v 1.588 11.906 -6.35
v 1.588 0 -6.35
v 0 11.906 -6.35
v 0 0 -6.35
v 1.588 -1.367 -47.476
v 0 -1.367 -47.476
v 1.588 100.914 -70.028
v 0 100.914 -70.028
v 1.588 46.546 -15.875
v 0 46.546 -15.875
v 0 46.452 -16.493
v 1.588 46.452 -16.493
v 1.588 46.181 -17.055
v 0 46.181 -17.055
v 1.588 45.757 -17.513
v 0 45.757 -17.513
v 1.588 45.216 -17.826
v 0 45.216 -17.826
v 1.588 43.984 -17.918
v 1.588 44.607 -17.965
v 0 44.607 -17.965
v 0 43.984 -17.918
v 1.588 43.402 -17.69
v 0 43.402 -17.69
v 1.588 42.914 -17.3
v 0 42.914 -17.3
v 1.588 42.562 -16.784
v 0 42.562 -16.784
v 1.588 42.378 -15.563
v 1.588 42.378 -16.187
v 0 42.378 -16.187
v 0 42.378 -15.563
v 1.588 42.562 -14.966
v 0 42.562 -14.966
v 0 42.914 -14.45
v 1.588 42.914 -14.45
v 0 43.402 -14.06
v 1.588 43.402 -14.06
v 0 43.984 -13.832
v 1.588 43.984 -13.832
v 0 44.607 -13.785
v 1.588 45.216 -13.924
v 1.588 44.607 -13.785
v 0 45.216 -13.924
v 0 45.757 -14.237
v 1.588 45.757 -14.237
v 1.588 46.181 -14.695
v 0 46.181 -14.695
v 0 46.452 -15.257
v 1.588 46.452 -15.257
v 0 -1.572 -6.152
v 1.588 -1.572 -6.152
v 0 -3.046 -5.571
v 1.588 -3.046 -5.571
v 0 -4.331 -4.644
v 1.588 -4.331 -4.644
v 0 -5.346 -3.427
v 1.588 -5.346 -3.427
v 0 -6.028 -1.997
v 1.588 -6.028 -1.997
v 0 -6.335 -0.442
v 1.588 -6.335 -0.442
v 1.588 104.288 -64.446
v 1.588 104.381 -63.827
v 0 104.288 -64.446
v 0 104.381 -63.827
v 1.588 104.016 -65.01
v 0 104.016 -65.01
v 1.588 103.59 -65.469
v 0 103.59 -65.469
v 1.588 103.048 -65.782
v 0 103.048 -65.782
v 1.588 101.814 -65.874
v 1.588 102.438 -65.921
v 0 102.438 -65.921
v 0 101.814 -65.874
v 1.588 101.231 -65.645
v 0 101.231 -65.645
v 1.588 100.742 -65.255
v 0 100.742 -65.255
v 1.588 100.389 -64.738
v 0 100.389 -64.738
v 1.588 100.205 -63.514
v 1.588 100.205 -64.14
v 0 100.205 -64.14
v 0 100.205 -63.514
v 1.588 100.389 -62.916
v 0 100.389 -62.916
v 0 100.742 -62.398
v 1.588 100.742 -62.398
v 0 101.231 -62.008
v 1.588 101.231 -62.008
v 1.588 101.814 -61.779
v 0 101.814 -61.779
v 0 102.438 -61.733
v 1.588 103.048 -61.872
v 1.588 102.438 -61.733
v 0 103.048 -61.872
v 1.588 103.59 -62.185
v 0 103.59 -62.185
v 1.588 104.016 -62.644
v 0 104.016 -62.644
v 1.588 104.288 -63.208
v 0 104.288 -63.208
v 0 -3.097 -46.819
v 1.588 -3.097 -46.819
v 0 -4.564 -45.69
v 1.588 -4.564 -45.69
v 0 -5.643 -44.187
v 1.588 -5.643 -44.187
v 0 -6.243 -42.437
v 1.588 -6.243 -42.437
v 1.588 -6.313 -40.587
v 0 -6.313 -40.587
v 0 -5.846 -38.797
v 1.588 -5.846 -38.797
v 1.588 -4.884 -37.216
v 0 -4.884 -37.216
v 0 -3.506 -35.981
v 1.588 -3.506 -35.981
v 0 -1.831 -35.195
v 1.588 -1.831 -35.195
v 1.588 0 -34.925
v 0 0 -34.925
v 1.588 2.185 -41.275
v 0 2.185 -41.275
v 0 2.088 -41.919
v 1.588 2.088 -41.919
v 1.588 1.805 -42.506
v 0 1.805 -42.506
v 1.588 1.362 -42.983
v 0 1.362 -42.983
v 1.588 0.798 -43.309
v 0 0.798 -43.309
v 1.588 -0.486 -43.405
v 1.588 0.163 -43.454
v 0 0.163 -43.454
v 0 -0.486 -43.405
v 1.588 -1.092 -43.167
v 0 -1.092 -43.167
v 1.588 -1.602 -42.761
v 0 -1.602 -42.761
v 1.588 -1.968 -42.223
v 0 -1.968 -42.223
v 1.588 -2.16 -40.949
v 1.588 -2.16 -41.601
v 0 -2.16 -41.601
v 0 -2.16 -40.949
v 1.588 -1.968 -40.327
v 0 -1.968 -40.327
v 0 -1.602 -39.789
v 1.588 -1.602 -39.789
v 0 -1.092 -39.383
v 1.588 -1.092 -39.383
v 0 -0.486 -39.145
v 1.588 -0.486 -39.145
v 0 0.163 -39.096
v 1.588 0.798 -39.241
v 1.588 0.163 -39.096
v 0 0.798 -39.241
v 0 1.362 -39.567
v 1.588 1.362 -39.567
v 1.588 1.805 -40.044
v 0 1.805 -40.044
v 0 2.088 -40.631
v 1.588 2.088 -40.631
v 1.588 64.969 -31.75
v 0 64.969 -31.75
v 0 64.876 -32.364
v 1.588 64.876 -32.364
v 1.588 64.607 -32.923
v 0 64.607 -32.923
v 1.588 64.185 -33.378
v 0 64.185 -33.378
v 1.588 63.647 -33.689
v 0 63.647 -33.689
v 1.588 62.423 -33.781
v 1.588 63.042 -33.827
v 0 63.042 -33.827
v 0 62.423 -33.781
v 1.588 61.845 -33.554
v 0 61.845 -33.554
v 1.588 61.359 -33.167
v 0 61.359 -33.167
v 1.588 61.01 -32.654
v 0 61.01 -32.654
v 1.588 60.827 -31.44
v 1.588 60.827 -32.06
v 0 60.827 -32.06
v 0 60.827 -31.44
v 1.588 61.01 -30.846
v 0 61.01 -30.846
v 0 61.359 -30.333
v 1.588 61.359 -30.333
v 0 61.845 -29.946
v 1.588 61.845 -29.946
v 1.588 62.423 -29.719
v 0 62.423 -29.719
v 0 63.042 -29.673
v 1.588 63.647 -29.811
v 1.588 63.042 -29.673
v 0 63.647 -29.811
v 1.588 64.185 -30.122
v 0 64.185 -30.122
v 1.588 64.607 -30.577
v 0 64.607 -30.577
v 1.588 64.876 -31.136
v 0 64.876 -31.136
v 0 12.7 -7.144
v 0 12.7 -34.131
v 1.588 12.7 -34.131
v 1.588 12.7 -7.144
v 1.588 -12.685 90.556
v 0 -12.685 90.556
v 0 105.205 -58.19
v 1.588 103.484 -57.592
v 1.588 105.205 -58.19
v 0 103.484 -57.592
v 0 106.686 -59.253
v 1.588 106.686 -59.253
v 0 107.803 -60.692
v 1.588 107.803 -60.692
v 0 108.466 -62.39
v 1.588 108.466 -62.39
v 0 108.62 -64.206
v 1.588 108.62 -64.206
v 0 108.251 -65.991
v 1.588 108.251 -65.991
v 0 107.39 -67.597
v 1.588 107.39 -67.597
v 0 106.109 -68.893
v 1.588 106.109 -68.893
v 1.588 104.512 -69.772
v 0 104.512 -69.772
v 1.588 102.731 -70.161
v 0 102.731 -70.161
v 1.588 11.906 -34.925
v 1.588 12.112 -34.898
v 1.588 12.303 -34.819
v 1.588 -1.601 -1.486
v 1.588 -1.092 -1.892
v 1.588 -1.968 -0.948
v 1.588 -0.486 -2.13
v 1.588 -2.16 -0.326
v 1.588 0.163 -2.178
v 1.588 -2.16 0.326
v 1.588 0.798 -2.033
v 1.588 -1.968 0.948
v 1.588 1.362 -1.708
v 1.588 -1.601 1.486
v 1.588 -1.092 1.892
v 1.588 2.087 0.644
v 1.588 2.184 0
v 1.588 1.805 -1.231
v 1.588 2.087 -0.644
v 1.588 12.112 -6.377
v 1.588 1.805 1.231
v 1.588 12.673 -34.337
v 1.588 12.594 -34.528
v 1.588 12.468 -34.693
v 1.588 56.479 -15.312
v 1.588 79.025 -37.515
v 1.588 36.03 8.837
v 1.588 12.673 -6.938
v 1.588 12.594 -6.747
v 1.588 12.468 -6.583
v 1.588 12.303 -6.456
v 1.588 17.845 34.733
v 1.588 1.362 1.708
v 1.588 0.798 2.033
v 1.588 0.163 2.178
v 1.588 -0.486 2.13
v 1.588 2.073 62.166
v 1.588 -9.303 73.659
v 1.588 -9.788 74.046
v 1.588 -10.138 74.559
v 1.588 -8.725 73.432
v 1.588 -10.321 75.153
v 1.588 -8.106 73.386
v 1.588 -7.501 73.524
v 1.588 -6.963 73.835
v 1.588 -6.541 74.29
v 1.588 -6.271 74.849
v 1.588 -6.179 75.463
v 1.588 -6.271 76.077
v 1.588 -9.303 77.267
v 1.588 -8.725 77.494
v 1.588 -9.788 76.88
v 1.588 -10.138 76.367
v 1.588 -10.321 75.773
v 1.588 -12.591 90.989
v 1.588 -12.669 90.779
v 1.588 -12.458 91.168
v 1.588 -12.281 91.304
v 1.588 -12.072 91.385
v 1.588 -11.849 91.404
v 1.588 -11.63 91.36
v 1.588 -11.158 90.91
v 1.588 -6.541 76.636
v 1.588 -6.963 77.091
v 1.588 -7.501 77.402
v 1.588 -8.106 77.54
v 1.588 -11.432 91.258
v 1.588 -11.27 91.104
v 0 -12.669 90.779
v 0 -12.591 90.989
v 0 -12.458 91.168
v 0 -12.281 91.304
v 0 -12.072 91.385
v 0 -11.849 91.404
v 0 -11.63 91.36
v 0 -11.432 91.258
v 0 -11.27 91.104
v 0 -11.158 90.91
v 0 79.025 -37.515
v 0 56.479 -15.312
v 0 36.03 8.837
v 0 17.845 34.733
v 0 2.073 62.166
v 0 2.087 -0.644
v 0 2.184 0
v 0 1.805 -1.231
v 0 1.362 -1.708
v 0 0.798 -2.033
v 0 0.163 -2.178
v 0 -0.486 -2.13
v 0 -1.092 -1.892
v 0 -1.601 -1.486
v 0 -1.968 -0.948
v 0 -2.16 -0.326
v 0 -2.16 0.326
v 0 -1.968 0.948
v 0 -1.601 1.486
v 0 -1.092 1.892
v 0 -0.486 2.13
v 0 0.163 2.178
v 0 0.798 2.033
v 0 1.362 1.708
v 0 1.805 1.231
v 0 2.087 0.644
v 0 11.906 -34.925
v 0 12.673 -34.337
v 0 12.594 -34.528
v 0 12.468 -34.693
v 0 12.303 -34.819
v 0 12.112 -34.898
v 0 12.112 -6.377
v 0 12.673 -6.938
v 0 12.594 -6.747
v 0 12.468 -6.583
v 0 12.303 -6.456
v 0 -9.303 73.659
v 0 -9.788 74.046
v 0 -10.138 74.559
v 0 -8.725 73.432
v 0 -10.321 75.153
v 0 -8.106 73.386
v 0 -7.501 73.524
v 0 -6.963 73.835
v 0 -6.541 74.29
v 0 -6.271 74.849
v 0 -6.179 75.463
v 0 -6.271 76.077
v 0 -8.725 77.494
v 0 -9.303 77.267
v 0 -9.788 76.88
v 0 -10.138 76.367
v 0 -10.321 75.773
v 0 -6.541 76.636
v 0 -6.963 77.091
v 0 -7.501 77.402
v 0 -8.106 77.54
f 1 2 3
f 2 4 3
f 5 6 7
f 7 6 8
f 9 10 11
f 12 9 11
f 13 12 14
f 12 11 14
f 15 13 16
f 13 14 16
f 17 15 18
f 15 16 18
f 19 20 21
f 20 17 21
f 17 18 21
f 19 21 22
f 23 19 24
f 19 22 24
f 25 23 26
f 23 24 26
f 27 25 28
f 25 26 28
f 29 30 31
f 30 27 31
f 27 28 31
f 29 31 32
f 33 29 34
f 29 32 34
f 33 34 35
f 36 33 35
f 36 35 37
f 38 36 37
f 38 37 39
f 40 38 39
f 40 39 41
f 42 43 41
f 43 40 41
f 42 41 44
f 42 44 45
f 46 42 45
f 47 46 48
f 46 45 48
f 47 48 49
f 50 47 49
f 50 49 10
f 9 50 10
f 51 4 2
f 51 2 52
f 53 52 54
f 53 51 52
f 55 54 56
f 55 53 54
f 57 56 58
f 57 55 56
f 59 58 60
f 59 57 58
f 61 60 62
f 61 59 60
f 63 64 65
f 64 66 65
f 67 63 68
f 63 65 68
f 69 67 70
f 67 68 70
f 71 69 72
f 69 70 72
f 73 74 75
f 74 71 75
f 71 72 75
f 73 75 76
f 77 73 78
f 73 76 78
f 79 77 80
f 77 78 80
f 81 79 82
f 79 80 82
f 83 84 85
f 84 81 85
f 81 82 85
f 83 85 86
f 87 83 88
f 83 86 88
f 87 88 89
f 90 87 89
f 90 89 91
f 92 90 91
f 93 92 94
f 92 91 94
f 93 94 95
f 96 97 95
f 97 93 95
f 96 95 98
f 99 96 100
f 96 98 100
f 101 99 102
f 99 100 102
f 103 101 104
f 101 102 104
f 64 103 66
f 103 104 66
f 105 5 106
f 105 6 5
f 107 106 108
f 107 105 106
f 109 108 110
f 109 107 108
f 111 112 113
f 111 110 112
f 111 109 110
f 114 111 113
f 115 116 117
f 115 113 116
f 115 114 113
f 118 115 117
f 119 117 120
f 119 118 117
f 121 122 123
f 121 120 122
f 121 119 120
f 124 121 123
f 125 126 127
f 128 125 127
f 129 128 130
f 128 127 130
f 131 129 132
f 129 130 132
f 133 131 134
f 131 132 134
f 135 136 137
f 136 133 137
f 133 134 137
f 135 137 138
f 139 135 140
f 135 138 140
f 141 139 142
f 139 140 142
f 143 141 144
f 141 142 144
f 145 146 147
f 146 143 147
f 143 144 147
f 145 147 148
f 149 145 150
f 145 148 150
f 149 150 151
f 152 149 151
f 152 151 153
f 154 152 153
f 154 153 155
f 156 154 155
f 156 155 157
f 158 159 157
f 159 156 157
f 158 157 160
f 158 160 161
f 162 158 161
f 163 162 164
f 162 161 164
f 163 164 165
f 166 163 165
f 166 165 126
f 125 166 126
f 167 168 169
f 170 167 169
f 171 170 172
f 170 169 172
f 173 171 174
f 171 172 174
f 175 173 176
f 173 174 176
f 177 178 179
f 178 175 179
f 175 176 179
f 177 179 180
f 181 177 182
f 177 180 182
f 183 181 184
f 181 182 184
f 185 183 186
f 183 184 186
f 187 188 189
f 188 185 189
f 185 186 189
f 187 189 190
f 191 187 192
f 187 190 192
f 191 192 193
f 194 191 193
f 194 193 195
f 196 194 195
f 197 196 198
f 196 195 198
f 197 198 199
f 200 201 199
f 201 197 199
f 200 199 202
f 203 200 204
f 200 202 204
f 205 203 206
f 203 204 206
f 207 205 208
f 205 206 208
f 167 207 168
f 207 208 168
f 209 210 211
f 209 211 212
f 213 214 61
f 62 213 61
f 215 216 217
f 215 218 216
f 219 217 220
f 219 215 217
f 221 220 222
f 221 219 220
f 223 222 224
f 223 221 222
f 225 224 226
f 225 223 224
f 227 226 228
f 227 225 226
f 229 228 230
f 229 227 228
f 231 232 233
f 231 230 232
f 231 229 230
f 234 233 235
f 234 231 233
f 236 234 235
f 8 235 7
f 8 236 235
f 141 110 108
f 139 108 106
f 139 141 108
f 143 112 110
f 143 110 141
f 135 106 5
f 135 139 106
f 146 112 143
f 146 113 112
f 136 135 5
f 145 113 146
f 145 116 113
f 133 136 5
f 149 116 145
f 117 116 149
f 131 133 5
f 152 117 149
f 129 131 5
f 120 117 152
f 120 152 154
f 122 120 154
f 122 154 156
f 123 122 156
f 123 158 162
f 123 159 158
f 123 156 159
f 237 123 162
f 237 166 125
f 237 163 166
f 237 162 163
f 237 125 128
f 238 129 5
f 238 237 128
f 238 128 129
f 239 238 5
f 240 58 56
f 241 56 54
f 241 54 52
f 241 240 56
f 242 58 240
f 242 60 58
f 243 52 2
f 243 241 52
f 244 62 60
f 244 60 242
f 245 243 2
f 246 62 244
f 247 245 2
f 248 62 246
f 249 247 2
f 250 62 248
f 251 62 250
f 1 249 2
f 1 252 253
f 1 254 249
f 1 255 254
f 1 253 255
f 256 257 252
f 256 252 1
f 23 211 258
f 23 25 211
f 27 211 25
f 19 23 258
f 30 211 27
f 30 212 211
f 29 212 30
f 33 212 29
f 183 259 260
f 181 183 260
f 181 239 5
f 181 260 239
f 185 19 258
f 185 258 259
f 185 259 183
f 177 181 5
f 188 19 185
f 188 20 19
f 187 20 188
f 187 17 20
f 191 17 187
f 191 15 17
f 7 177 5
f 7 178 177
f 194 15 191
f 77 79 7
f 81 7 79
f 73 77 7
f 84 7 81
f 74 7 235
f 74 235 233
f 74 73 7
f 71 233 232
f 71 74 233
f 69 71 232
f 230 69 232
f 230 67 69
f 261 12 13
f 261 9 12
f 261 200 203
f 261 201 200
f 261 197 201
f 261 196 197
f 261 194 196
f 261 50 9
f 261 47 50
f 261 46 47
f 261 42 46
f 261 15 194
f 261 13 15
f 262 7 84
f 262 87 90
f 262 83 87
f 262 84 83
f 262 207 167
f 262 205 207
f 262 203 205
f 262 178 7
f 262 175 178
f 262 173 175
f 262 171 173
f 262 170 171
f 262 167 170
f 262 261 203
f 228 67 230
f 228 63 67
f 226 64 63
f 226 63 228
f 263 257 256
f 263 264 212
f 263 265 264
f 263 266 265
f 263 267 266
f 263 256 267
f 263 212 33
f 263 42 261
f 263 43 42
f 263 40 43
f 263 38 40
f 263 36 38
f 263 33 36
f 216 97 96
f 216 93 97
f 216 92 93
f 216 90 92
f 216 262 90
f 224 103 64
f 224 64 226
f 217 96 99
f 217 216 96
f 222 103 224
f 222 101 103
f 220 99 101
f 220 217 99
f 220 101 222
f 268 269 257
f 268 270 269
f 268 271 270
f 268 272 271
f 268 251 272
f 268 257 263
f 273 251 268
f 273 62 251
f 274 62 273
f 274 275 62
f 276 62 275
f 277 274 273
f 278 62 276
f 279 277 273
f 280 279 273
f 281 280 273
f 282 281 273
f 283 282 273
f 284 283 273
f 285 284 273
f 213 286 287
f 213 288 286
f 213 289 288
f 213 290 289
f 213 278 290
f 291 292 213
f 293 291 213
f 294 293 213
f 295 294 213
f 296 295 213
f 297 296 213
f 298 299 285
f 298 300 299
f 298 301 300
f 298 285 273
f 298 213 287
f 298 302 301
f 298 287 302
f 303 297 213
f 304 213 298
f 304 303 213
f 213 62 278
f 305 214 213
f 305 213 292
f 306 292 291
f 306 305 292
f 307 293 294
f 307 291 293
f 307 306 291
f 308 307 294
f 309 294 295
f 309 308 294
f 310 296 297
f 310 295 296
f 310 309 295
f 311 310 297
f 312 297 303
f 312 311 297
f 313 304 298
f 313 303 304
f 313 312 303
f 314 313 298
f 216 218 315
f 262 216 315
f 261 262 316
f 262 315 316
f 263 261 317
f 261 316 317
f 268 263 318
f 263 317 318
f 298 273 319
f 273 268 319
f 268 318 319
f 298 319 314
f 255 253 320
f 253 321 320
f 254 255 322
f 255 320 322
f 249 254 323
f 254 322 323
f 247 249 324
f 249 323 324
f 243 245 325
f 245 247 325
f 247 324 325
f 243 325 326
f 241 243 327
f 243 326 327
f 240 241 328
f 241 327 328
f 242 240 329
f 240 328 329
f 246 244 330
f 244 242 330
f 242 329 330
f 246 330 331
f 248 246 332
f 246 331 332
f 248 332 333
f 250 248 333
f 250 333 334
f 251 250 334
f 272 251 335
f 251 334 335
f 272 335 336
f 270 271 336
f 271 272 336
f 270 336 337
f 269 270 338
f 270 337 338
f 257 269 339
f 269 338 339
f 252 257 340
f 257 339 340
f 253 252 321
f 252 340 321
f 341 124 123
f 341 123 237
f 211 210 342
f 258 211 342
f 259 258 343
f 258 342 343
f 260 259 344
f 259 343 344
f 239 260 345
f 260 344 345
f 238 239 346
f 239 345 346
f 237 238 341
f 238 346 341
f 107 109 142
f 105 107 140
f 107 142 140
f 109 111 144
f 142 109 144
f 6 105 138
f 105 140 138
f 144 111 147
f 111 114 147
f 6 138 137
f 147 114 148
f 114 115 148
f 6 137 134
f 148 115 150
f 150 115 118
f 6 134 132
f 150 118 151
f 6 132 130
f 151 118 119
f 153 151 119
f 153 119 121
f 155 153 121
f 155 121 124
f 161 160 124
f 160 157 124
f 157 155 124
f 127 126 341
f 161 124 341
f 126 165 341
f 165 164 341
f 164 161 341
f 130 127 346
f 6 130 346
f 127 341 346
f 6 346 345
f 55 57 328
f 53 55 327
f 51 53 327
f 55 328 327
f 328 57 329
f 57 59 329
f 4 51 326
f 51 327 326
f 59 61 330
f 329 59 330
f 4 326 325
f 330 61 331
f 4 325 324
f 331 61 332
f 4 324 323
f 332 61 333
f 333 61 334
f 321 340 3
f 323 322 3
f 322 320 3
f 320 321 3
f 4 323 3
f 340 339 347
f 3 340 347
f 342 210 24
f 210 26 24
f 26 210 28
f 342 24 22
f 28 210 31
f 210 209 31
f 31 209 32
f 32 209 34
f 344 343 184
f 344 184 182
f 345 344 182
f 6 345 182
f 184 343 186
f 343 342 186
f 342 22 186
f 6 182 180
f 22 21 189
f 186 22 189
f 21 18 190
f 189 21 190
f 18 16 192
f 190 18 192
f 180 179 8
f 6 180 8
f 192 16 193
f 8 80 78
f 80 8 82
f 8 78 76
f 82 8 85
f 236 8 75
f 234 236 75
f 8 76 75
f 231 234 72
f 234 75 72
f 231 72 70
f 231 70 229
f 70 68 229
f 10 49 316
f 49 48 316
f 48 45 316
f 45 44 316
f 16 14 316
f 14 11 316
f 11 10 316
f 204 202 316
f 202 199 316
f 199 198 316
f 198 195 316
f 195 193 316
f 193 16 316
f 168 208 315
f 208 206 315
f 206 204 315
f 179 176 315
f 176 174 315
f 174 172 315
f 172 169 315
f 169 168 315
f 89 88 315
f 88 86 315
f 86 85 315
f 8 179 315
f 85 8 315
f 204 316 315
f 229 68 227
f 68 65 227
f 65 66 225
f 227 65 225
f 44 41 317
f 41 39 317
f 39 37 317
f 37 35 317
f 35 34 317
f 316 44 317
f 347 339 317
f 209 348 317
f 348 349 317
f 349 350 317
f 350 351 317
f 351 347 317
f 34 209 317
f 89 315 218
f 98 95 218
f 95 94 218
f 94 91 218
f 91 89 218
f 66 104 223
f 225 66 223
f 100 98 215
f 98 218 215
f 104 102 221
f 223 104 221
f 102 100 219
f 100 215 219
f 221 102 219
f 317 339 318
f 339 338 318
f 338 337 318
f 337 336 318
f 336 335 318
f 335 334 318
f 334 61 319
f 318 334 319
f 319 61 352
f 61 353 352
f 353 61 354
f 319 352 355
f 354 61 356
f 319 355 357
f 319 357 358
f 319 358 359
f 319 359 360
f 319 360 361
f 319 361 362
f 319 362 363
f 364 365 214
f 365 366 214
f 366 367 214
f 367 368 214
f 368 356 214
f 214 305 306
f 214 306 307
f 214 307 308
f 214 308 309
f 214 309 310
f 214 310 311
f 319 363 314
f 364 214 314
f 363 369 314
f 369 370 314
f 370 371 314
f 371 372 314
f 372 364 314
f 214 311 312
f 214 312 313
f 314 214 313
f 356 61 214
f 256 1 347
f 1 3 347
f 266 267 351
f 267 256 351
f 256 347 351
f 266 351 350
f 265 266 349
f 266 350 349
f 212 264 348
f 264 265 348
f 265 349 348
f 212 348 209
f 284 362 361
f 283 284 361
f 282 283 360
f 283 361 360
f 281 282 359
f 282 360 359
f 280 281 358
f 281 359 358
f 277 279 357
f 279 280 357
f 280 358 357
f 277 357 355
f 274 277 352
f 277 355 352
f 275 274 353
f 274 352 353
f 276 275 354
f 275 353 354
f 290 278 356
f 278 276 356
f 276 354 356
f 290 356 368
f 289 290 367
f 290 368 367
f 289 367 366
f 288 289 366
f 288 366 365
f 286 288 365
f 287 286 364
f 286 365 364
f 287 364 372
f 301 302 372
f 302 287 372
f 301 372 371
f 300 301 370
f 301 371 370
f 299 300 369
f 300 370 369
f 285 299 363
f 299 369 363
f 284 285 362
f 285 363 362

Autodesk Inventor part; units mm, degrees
ref_plane "YZ Plane" through (0, 0, 0) normal (1, 0, 0) x (0, 1, 0)
ref_plane "XZ Plane" through (0, 0, 0) normal (0, 1, 0) x (-1, 0, 0)
ref_plane "XY Plane" through (0, 0, 0) normal (0, 0, 1) x (1, 0, 0)
sketch "main" plane through (0, 0, 0) normal (0, 0, 1) x (1, 0, 0)
  circle A0 centre (-198.1135, 49.9495) radius 2.1844
  circle A1 centre (-95.8324, -13.8772) radius 2.1
  arc A2 (-99.5351, -19.036) -> (-94.63, -7.6421) centre (-95.8324, -13.8772) ccw
  arc A3 (-204.4481, 49.5075) -> (-198.1135, 43.5995) centre (-198.1135, 49.9495) ccw
  line L0 (-210.7981, 140.5057) -> (-204.4481, 49.5075)
  arc A4 (-209.271, 140.8599) -> (-94.63, -7.6421) centre (115.0165, 272.7027) ccw
  circle A5 centre (-206.375, 125.4125) radius 2.0828
  line L1 (-198.1135, 43.5995) -> (-186.2072, 43.5995)
  arc A6 (-209.271, 140.8599) -> (-210.7981, 140.5057) centre (-210.0063, 140.561) ccw
  circle A7 centre (-135.2274, 18.1995) radius 2.0828
  line L2 (-185.4135, 15.8183) -> (-185.4135, 42.8058)
  line L3 (-198.1135, 15.0245) -> (-186.2072, 15.0245)
  arc A8 (-185.4135, 42.8058) -> (-186.2072, 43.5995) centre (-186.2072, 42.8058) ccw
  arc A9 (-186.2072, 15.0245) -> (-185.4135, 15.8183) centre (-186.2072, 15.8183) ccw
  line L4 (-199.4808, 2.4735) -> (-97.1997, -20.0783)
  circle A10 centre (-198.1135, 8.6745) radius 2.1848
  arc A11 (-198.1135, 15.0245) -> (-199.4808, 2.4735) centre (-198.1135, 8.6745) ccw
  point P0 (1.1251, 9.7944)
  point P1 (-211.1526, 145.5863)
  point P2 (-191.7635, 49.9495)
  dimension "d7" = 12.7
  dimension "d8" = 4.1656
  dimension "d9" = 6.35
  dimension "d11" = 0.7937
  dimension "d13" = 4.1656
  dimension "d16" = 0.7937
  dimension "d19" = 26.9875
  dimension "d20" = 0
  dimension "d21" = 6.35
  dimension "d24" = 6.35
sketch "Sketch1" plane through (0, 0, 0) normal (1, 0, 0) x (0, 1, 0)
  circle A0 centre (44.45, -15.875) radius 2.0955
  circle A1 centre (0, 0) radius 2.1844
  circle A2 centre (102.2811, -63.8268) radius 2.1
  arc A3 (98.5784, -68.9855) -> (103.4835, -57.5917) centre (102.2811, -63.8268) ccw
  arc A4 (-6.3346, -0.442) -> (0, -6.35) centre (0, 0) ccw
  line L0 (-12.6846, 90.5562) -> (-6.3346, -0.442)
  arc A5 (-11.1575, 90.9104) -> (103.4835, -57.5917) centre (313.1299, 222.7532) ccw
  circle A6 centre (-8.2615, 75.463) radius 2.0828
  line L1 (0, -6.35) -> (11.9063, -6.35)
  arc A7 (-11.1575, 90.9104) -> (-12.6846, 90.5562) centre (-11.8928, 90.6114) ccw
  circle A8 centre (62.8861, -31.75) radius 2.0828
  line L2 (12.7, -34.1313) -> (12.7, -7.1438)
  line L3 (0, -34.925) -> (11.9063, -34.925)
  arc A9 (12.7, -7.1438) -> (11.9063, -6.35) centre (11.9063, -7.1437) ccw
  arc A10 (11.9063, -34.925) -> (12.7, -34.1313) centre (11.9063, -34.1313) ccw
  line L4 (-1.3673, -47.4761) -> (100.9138, -70.0278)
  circle A11 centre (0, -41.275) radius 2.1848
  arc A12 (0, -34.925) -> (-1.3673, -47.4761) centre (0, -41.275) ccw
  dimension "d18" = 4.191
extrude "Extrusion1" add sketch "Sketch1" along normal blind 1.5875
equation "\"BendRadius\" = Thickness"
equation "\"BendReliefWidth\" = Thickness"
equation "\"BendReliefDepth\" = 0.5 * Thickness"
equation "\"CornerReliefSize\" = 4 * Thickness"
equation "\"MinimumRemnant\" = 2 * Thickness"
equation "\"TransitionRadius\" = BendRadius"
equation "\"JacobiRadiusSize\" = BendRadius"
equation "\"GapSize\" = Thickness"
equation "\"Thickness\" = 1.5875"
properties part number "Ramp V2" material "Acetal Resin, White"
